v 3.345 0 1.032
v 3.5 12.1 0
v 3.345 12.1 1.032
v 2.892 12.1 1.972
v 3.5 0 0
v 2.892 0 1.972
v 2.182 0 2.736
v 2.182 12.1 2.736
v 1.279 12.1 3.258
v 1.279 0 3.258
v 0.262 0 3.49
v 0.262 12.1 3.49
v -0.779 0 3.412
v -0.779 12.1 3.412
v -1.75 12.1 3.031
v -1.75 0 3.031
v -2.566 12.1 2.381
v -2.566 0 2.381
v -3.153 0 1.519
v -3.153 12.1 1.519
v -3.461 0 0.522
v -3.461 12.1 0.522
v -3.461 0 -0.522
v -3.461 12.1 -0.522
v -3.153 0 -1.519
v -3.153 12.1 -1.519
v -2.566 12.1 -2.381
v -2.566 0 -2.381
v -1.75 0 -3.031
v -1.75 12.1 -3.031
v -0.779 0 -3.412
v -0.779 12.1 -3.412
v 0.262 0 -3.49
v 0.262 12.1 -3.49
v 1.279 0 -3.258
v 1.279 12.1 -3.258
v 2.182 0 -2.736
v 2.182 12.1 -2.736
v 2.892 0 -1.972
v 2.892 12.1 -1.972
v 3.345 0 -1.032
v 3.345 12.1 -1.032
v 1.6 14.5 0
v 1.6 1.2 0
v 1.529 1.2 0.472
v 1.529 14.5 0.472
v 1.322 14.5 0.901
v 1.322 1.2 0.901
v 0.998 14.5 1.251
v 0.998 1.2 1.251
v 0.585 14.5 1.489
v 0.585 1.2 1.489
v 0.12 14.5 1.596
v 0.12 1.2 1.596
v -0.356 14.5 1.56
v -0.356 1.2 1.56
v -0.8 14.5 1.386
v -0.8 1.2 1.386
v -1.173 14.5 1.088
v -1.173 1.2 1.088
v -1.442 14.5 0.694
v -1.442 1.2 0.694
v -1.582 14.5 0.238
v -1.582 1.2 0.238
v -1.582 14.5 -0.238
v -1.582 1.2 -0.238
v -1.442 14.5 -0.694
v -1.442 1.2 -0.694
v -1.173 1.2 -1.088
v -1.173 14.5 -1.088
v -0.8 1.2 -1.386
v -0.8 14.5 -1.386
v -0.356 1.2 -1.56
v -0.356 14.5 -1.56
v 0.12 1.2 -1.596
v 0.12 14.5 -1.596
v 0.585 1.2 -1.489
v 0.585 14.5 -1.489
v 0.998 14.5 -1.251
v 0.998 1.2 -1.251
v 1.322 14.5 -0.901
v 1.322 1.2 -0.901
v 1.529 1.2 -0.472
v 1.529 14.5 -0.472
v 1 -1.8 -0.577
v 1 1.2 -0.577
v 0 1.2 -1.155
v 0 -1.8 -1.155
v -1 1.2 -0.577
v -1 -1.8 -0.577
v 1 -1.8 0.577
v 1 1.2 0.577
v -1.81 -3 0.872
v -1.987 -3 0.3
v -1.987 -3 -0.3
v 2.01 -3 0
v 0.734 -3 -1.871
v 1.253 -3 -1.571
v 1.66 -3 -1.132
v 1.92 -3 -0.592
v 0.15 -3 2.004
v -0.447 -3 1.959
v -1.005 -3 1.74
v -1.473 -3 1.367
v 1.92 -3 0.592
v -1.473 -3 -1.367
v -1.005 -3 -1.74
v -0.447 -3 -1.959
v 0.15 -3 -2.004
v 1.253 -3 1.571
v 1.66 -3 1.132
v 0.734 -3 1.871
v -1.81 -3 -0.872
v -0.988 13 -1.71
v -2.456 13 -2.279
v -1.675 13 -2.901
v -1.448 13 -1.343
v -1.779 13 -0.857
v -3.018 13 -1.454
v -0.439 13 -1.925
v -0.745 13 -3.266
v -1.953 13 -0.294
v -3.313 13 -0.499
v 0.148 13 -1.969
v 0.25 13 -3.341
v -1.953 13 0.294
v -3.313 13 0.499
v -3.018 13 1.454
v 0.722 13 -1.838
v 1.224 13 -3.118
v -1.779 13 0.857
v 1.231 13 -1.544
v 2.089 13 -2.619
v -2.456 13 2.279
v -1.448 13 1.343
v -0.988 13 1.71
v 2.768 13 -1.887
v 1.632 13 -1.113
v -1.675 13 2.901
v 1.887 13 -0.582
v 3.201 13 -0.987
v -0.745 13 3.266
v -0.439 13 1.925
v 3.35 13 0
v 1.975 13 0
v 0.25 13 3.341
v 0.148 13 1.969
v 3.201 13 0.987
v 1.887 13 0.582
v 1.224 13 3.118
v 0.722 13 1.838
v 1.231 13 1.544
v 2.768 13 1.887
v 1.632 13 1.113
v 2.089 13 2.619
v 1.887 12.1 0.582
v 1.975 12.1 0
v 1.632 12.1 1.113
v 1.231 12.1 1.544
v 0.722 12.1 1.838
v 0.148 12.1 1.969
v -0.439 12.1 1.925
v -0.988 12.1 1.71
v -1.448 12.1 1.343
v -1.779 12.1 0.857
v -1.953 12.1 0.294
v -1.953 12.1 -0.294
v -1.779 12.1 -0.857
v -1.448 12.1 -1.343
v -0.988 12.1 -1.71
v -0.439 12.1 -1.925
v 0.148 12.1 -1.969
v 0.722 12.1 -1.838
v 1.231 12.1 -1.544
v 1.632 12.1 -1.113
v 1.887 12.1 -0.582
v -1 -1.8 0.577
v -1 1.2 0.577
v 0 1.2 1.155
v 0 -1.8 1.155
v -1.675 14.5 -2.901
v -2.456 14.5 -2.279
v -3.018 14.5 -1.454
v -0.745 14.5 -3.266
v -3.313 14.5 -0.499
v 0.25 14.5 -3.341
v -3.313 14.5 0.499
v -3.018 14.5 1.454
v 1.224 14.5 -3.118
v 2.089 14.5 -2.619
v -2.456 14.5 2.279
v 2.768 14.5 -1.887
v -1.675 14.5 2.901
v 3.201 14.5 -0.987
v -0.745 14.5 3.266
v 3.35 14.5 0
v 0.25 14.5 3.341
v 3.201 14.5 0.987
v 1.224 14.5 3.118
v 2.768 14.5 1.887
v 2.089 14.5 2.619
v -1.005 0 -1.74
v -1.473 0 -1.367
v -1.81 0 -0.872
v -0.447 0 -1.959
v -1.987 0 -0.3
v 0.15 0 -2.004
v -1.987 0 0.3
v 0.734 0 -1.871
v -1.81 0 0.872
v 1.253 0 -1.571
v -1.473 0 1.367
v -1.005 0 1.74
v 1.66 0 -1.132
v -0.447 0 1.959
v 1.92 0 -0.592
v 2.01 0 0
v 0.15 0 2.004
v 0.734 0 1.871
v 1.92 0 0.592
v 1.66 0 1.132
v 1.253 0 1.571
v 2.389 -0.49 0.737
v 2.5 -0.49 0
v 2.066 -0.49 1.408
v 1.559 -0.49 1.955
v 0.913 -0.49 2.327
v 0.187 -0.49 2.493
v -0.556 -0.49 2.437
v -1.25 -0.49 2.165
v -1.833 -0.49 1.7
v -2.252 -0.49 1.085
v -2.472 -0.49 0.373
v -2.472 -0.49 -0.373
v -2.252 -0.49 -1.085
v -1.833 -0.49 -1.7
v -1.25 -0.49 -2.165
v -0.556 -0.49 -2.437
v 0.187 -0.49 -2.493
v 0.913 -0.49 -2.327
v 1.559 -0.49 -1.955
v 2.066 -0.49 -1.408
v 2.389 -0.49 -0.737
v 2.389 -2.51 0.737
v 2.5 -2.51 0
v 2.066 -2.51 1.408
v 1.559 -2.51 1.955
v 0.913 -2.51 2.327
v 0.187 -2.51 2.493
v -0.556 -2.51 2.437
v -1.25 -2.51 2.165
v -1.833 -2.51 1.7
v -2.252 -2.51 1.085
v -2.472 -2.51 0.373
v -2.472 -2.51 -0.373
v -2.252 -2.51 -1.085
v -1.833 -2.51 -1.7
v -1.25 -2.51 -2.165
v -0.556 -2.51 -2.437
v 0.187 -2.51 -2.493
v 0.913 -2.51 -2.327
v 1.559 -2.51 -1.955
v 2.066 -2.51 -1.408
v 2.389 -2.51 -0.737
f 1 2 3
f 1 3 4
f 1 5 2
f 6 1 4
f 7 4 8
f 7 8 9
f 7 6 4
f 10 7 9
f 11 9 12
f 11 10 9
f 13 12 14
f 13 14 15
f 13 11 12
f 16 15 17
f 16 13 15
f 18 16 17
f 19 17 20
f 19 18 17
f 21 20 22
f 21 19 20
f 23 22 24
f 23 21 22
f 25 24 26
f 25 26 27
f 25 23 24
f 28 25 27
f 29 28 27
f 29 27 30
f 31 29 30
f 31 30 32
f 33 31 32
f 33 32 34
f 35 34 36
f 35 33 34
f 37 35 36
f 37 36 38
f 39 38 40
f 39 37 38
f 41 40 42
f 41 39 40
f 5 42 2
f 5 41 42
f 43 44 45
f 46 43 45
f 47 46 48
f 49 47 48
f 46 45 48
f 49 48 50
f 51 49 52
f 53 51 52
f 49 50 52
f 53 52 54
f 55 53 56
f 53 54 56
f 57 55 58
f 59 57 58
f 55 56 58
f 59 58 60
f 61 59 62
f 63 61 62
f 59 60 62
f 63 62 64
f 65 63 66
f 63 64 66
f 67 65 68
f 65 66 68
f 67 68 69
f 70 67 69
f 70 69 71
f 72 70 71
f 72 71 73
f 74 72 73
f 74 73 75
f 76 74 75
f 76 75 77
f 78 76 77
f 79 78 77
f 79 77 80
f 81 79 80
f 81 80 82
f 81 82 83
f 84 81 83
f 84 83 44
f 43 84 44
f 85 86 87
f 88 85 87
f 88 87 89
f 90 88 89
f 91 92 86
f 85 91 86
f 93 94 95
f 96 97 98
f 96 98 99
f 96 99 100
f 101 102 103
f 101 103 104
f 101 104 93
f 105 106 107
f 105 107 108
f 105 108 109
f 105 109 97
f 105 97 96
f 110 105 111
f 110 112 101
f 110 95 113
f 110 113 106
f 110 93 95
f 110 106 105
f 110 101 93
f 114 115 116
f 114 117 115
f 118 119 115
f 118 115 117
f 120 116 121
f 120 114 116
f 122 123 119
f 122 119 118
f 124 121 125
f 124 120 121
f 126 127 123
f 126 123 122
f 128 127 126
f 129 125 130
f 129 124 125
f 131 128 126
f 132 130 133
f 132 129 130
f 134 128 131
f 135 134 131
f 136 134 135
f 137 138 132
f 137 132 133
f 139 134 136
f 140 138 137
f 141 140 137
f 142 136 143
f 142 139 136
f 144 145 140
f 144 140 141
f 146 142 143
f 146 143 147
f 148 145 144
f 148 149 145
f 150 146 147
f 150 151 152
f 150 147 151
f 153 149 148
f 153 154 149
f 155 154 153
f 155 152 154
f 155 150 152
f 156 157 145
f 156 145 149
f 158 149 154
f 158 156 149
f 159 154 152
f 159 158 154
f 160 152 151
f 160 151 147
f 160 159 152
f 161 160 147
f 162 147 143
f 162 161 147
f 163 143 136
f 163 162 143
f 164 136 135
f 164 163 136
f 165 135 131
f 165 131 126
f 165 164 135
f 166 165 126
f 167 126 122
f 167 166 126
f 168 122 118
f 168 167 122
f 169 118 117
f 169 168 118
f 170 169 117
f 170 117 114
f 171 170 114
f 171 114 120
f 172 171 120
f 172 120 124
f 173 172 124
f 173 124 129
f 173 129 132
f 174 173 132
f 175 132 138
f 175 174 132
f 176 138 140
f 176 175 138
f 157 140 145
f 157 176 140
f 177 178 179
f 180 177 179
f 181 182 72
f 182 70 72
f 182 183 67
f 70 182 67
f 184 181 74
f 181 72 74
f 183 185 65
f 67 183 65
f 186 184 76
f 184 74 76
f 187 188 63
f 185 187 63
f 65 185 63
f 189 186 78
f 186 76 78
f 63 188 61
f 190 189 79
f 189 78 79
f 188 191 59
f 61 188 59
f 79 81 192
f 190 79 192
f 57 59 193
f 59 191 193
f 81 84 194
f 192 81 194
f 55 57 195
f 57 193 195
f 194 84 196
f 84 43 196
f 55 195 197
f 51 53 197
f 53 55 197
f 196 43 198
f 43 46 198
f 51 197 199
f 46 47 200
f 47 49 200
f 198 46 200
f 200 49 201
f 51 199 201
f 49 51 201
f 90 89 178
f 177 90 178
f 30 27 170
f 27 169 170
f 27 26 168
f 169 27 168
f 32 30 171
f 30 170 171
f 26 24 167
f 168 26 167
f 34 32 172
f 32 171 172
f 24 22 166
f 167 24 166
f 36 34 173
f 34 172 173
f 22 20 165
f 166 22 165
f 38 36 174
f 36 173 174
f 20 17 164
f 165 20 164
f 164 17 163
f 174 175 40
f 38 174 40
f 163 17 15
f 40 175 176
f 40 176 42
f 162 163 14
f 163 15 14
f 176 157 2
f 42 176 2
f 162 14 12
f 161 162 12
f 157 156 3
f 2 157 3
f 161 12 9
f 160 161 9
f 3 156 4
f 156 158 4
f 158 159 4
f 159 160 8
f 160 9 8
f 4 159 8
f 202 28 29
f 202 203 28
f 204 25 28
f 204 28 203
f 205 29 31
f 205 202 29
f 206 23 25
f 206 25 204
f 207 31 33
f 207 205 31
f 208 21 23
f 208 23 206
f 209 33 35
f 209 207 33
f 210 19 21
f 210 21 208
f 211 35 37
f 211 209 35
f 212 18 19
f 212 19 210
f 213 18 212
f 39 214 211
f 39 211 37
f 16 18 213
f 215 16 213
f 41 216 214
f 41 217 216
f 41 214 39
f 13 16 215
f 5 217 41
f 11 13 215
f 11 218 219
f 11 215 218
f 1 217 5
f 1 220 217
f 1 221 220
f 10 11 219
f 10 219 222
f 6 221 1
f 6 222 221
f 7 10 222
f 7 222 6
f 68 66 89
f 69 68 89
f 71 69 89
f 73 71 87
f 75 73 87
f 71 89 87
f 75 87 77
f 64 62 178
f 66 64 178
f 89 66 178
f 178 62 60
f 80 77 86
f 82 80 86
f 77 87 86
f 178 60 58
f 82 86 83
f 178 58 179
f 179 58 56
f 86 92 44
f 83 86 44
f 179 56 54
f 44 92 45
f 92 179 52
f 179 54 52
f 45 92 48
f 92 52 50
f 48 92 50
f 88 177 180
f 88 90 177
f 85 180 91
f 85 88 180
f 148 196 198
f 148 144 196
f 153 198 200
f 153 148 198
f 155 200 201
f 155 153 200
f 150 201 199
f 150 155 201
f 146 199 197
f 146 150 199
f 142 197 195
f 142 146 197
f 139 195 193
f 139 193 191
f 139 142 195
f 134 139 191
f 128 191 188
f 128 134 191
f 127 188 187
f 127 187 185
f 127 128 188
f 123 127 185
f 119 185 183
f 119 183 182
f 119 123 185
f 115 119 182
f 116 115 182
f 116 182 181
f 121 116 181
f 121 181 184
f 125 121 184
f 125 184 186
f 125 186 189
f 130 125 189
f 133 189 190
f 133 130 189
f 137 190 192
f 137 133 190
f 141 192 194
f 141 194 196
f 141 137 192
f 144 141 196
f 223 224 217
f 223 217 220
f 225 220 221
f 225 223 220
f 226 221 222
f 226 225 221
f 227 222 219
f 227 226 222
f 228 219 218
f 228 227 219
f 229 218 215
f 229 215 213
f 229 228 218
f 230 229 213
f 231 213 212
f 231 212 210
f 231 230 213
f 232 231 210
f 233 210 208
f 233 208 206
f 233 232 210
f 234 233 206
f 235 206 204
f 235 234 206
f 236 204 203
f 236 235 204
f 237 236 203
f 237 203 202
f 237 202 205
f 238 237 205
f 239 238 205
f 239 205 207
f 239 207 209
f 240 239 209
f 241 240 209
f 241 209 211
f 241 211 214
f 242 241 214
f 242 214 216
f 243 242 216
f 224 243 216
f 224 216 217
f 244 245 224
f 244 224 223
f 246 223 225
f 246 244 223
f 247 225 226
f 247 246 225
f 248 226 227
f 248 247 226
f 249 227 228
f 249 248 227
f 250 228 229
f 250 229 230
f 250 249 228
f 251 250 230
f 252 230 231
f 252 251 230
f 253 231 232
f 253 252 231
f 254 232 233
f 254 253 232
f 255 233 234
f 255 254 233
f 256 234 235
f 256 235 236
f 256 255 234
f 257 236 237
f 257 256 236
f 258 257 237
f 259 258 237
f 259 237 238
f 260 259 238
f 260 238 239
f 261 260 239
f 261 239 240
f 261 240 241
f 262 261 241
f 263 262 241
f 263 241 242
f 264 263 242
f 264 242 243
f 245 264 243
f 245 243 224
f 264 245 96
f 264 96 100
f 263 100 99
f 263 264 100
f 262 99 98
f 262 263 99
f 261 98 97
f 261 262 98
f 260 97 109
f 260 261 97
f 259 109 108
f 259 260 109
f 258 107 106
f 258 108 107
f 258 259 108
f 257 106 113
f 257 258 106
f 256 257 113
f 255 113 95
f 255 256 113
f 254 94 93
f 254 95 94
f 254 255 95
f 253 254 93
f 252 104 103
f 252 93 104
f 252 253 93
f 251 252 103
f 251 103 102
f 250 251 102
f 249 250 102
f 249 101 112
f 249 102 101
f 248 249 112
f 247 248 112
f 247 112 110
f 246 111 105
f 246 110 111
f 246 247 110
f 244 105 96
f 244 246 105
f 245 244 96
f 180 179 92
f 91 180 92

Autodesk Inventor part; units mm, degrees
ref_plane "YZ Plane" through (0, 0, 0) normal (1, 0, 0) x (0, 1, 0)
ref_plane "XZ Plane" through (0, 0, 0) normal (0, 1, 0) x (-1, 0, 0)
ref_plane "XY Plane" through (0, 0, 0) normal (0, 0, 1) x (1, 0, 0)
sketch "Sketch_1" plane through (0, 0, 0) normal (0, 0, 1) x (1, 0, 0)
  line L0 (0, -3) -> (0, 14.5)
  line L1 (0, 14.5) -> (3.35, 14.5)
  line L2 (3.35, 14.5) -> (3.35, 13)
  line L3 (3.35, 13) -> (1.975, 13)
  line L4 (1.975, 13) -> (1.975, 12.1)
  line L5 (1.975, 12.1) -> (3.5, 12.1)
  line L6 (3.5, 12.1) -> (3.5, 0)
  line L7 (3.5, 0) -> (2.0095, 0)
  line L8 (2.0095, 0) -> (2.5, -0.4905)
  line L9 (2.5, -0.4905) -> (2.5, -2.5095)
  line L10 (2.5, -2.5095) -> (2.0095, -3)
  line L11 (2.0095, -3) -> (0, -3)
  line L12 (0, -3) -> (0, 14.5)
revolve "Revolution1" add sketch "Sketch_1" angle 360 about axis through (0, -3, 0) along (0, -1, 0)
thread "Thread1" size "M5x0.8" class "6g" standard "ISO Metric profile" full length
sketch "Sketch_2" plane through (0, 0, 0) normal (0, 0, 1) x (1, 0, 0)
  line L0 (0, 1.2) -> (0, 14.5)
  line L1 (0, 14.5) -> (1.6, 14.5)
  line L2 (1.6, 14.5) -> (1.6, 1.2)
  line L3 (1.6, 1.2) -> (0, 1.2)
  line L4 (0, 1.2) -> (0, 14.5)
revolve "Revolution2" cut sketch "Sketch_2" angle 360 about axis through (0, 1.2, 0) along (0, -1, 0)
sketch "Sketch_3" plane through (0, 14.5, 0) normal (0, 1, 0) x (1, 0, 0)
  line L0 (-1, 0.5774) -> (-1, -0.5774)
  line L1 (-1, -0.5774) -> (0, -1.1547)
  line L2 (0, -1.1547) -> (1, -0.5774)
  line L3 (1, -0.5774) -> (1, 0.5774)
  line L4 (1, 0.5774) -> (0, 1.1547)
  line L5 (0, 1.1547) -> (-1, 0.5774)
extrude "Extrusion1" cut sketch "Sketch_3" against normal blind 16.3
properties part number "KQ2S23-M5N N"
